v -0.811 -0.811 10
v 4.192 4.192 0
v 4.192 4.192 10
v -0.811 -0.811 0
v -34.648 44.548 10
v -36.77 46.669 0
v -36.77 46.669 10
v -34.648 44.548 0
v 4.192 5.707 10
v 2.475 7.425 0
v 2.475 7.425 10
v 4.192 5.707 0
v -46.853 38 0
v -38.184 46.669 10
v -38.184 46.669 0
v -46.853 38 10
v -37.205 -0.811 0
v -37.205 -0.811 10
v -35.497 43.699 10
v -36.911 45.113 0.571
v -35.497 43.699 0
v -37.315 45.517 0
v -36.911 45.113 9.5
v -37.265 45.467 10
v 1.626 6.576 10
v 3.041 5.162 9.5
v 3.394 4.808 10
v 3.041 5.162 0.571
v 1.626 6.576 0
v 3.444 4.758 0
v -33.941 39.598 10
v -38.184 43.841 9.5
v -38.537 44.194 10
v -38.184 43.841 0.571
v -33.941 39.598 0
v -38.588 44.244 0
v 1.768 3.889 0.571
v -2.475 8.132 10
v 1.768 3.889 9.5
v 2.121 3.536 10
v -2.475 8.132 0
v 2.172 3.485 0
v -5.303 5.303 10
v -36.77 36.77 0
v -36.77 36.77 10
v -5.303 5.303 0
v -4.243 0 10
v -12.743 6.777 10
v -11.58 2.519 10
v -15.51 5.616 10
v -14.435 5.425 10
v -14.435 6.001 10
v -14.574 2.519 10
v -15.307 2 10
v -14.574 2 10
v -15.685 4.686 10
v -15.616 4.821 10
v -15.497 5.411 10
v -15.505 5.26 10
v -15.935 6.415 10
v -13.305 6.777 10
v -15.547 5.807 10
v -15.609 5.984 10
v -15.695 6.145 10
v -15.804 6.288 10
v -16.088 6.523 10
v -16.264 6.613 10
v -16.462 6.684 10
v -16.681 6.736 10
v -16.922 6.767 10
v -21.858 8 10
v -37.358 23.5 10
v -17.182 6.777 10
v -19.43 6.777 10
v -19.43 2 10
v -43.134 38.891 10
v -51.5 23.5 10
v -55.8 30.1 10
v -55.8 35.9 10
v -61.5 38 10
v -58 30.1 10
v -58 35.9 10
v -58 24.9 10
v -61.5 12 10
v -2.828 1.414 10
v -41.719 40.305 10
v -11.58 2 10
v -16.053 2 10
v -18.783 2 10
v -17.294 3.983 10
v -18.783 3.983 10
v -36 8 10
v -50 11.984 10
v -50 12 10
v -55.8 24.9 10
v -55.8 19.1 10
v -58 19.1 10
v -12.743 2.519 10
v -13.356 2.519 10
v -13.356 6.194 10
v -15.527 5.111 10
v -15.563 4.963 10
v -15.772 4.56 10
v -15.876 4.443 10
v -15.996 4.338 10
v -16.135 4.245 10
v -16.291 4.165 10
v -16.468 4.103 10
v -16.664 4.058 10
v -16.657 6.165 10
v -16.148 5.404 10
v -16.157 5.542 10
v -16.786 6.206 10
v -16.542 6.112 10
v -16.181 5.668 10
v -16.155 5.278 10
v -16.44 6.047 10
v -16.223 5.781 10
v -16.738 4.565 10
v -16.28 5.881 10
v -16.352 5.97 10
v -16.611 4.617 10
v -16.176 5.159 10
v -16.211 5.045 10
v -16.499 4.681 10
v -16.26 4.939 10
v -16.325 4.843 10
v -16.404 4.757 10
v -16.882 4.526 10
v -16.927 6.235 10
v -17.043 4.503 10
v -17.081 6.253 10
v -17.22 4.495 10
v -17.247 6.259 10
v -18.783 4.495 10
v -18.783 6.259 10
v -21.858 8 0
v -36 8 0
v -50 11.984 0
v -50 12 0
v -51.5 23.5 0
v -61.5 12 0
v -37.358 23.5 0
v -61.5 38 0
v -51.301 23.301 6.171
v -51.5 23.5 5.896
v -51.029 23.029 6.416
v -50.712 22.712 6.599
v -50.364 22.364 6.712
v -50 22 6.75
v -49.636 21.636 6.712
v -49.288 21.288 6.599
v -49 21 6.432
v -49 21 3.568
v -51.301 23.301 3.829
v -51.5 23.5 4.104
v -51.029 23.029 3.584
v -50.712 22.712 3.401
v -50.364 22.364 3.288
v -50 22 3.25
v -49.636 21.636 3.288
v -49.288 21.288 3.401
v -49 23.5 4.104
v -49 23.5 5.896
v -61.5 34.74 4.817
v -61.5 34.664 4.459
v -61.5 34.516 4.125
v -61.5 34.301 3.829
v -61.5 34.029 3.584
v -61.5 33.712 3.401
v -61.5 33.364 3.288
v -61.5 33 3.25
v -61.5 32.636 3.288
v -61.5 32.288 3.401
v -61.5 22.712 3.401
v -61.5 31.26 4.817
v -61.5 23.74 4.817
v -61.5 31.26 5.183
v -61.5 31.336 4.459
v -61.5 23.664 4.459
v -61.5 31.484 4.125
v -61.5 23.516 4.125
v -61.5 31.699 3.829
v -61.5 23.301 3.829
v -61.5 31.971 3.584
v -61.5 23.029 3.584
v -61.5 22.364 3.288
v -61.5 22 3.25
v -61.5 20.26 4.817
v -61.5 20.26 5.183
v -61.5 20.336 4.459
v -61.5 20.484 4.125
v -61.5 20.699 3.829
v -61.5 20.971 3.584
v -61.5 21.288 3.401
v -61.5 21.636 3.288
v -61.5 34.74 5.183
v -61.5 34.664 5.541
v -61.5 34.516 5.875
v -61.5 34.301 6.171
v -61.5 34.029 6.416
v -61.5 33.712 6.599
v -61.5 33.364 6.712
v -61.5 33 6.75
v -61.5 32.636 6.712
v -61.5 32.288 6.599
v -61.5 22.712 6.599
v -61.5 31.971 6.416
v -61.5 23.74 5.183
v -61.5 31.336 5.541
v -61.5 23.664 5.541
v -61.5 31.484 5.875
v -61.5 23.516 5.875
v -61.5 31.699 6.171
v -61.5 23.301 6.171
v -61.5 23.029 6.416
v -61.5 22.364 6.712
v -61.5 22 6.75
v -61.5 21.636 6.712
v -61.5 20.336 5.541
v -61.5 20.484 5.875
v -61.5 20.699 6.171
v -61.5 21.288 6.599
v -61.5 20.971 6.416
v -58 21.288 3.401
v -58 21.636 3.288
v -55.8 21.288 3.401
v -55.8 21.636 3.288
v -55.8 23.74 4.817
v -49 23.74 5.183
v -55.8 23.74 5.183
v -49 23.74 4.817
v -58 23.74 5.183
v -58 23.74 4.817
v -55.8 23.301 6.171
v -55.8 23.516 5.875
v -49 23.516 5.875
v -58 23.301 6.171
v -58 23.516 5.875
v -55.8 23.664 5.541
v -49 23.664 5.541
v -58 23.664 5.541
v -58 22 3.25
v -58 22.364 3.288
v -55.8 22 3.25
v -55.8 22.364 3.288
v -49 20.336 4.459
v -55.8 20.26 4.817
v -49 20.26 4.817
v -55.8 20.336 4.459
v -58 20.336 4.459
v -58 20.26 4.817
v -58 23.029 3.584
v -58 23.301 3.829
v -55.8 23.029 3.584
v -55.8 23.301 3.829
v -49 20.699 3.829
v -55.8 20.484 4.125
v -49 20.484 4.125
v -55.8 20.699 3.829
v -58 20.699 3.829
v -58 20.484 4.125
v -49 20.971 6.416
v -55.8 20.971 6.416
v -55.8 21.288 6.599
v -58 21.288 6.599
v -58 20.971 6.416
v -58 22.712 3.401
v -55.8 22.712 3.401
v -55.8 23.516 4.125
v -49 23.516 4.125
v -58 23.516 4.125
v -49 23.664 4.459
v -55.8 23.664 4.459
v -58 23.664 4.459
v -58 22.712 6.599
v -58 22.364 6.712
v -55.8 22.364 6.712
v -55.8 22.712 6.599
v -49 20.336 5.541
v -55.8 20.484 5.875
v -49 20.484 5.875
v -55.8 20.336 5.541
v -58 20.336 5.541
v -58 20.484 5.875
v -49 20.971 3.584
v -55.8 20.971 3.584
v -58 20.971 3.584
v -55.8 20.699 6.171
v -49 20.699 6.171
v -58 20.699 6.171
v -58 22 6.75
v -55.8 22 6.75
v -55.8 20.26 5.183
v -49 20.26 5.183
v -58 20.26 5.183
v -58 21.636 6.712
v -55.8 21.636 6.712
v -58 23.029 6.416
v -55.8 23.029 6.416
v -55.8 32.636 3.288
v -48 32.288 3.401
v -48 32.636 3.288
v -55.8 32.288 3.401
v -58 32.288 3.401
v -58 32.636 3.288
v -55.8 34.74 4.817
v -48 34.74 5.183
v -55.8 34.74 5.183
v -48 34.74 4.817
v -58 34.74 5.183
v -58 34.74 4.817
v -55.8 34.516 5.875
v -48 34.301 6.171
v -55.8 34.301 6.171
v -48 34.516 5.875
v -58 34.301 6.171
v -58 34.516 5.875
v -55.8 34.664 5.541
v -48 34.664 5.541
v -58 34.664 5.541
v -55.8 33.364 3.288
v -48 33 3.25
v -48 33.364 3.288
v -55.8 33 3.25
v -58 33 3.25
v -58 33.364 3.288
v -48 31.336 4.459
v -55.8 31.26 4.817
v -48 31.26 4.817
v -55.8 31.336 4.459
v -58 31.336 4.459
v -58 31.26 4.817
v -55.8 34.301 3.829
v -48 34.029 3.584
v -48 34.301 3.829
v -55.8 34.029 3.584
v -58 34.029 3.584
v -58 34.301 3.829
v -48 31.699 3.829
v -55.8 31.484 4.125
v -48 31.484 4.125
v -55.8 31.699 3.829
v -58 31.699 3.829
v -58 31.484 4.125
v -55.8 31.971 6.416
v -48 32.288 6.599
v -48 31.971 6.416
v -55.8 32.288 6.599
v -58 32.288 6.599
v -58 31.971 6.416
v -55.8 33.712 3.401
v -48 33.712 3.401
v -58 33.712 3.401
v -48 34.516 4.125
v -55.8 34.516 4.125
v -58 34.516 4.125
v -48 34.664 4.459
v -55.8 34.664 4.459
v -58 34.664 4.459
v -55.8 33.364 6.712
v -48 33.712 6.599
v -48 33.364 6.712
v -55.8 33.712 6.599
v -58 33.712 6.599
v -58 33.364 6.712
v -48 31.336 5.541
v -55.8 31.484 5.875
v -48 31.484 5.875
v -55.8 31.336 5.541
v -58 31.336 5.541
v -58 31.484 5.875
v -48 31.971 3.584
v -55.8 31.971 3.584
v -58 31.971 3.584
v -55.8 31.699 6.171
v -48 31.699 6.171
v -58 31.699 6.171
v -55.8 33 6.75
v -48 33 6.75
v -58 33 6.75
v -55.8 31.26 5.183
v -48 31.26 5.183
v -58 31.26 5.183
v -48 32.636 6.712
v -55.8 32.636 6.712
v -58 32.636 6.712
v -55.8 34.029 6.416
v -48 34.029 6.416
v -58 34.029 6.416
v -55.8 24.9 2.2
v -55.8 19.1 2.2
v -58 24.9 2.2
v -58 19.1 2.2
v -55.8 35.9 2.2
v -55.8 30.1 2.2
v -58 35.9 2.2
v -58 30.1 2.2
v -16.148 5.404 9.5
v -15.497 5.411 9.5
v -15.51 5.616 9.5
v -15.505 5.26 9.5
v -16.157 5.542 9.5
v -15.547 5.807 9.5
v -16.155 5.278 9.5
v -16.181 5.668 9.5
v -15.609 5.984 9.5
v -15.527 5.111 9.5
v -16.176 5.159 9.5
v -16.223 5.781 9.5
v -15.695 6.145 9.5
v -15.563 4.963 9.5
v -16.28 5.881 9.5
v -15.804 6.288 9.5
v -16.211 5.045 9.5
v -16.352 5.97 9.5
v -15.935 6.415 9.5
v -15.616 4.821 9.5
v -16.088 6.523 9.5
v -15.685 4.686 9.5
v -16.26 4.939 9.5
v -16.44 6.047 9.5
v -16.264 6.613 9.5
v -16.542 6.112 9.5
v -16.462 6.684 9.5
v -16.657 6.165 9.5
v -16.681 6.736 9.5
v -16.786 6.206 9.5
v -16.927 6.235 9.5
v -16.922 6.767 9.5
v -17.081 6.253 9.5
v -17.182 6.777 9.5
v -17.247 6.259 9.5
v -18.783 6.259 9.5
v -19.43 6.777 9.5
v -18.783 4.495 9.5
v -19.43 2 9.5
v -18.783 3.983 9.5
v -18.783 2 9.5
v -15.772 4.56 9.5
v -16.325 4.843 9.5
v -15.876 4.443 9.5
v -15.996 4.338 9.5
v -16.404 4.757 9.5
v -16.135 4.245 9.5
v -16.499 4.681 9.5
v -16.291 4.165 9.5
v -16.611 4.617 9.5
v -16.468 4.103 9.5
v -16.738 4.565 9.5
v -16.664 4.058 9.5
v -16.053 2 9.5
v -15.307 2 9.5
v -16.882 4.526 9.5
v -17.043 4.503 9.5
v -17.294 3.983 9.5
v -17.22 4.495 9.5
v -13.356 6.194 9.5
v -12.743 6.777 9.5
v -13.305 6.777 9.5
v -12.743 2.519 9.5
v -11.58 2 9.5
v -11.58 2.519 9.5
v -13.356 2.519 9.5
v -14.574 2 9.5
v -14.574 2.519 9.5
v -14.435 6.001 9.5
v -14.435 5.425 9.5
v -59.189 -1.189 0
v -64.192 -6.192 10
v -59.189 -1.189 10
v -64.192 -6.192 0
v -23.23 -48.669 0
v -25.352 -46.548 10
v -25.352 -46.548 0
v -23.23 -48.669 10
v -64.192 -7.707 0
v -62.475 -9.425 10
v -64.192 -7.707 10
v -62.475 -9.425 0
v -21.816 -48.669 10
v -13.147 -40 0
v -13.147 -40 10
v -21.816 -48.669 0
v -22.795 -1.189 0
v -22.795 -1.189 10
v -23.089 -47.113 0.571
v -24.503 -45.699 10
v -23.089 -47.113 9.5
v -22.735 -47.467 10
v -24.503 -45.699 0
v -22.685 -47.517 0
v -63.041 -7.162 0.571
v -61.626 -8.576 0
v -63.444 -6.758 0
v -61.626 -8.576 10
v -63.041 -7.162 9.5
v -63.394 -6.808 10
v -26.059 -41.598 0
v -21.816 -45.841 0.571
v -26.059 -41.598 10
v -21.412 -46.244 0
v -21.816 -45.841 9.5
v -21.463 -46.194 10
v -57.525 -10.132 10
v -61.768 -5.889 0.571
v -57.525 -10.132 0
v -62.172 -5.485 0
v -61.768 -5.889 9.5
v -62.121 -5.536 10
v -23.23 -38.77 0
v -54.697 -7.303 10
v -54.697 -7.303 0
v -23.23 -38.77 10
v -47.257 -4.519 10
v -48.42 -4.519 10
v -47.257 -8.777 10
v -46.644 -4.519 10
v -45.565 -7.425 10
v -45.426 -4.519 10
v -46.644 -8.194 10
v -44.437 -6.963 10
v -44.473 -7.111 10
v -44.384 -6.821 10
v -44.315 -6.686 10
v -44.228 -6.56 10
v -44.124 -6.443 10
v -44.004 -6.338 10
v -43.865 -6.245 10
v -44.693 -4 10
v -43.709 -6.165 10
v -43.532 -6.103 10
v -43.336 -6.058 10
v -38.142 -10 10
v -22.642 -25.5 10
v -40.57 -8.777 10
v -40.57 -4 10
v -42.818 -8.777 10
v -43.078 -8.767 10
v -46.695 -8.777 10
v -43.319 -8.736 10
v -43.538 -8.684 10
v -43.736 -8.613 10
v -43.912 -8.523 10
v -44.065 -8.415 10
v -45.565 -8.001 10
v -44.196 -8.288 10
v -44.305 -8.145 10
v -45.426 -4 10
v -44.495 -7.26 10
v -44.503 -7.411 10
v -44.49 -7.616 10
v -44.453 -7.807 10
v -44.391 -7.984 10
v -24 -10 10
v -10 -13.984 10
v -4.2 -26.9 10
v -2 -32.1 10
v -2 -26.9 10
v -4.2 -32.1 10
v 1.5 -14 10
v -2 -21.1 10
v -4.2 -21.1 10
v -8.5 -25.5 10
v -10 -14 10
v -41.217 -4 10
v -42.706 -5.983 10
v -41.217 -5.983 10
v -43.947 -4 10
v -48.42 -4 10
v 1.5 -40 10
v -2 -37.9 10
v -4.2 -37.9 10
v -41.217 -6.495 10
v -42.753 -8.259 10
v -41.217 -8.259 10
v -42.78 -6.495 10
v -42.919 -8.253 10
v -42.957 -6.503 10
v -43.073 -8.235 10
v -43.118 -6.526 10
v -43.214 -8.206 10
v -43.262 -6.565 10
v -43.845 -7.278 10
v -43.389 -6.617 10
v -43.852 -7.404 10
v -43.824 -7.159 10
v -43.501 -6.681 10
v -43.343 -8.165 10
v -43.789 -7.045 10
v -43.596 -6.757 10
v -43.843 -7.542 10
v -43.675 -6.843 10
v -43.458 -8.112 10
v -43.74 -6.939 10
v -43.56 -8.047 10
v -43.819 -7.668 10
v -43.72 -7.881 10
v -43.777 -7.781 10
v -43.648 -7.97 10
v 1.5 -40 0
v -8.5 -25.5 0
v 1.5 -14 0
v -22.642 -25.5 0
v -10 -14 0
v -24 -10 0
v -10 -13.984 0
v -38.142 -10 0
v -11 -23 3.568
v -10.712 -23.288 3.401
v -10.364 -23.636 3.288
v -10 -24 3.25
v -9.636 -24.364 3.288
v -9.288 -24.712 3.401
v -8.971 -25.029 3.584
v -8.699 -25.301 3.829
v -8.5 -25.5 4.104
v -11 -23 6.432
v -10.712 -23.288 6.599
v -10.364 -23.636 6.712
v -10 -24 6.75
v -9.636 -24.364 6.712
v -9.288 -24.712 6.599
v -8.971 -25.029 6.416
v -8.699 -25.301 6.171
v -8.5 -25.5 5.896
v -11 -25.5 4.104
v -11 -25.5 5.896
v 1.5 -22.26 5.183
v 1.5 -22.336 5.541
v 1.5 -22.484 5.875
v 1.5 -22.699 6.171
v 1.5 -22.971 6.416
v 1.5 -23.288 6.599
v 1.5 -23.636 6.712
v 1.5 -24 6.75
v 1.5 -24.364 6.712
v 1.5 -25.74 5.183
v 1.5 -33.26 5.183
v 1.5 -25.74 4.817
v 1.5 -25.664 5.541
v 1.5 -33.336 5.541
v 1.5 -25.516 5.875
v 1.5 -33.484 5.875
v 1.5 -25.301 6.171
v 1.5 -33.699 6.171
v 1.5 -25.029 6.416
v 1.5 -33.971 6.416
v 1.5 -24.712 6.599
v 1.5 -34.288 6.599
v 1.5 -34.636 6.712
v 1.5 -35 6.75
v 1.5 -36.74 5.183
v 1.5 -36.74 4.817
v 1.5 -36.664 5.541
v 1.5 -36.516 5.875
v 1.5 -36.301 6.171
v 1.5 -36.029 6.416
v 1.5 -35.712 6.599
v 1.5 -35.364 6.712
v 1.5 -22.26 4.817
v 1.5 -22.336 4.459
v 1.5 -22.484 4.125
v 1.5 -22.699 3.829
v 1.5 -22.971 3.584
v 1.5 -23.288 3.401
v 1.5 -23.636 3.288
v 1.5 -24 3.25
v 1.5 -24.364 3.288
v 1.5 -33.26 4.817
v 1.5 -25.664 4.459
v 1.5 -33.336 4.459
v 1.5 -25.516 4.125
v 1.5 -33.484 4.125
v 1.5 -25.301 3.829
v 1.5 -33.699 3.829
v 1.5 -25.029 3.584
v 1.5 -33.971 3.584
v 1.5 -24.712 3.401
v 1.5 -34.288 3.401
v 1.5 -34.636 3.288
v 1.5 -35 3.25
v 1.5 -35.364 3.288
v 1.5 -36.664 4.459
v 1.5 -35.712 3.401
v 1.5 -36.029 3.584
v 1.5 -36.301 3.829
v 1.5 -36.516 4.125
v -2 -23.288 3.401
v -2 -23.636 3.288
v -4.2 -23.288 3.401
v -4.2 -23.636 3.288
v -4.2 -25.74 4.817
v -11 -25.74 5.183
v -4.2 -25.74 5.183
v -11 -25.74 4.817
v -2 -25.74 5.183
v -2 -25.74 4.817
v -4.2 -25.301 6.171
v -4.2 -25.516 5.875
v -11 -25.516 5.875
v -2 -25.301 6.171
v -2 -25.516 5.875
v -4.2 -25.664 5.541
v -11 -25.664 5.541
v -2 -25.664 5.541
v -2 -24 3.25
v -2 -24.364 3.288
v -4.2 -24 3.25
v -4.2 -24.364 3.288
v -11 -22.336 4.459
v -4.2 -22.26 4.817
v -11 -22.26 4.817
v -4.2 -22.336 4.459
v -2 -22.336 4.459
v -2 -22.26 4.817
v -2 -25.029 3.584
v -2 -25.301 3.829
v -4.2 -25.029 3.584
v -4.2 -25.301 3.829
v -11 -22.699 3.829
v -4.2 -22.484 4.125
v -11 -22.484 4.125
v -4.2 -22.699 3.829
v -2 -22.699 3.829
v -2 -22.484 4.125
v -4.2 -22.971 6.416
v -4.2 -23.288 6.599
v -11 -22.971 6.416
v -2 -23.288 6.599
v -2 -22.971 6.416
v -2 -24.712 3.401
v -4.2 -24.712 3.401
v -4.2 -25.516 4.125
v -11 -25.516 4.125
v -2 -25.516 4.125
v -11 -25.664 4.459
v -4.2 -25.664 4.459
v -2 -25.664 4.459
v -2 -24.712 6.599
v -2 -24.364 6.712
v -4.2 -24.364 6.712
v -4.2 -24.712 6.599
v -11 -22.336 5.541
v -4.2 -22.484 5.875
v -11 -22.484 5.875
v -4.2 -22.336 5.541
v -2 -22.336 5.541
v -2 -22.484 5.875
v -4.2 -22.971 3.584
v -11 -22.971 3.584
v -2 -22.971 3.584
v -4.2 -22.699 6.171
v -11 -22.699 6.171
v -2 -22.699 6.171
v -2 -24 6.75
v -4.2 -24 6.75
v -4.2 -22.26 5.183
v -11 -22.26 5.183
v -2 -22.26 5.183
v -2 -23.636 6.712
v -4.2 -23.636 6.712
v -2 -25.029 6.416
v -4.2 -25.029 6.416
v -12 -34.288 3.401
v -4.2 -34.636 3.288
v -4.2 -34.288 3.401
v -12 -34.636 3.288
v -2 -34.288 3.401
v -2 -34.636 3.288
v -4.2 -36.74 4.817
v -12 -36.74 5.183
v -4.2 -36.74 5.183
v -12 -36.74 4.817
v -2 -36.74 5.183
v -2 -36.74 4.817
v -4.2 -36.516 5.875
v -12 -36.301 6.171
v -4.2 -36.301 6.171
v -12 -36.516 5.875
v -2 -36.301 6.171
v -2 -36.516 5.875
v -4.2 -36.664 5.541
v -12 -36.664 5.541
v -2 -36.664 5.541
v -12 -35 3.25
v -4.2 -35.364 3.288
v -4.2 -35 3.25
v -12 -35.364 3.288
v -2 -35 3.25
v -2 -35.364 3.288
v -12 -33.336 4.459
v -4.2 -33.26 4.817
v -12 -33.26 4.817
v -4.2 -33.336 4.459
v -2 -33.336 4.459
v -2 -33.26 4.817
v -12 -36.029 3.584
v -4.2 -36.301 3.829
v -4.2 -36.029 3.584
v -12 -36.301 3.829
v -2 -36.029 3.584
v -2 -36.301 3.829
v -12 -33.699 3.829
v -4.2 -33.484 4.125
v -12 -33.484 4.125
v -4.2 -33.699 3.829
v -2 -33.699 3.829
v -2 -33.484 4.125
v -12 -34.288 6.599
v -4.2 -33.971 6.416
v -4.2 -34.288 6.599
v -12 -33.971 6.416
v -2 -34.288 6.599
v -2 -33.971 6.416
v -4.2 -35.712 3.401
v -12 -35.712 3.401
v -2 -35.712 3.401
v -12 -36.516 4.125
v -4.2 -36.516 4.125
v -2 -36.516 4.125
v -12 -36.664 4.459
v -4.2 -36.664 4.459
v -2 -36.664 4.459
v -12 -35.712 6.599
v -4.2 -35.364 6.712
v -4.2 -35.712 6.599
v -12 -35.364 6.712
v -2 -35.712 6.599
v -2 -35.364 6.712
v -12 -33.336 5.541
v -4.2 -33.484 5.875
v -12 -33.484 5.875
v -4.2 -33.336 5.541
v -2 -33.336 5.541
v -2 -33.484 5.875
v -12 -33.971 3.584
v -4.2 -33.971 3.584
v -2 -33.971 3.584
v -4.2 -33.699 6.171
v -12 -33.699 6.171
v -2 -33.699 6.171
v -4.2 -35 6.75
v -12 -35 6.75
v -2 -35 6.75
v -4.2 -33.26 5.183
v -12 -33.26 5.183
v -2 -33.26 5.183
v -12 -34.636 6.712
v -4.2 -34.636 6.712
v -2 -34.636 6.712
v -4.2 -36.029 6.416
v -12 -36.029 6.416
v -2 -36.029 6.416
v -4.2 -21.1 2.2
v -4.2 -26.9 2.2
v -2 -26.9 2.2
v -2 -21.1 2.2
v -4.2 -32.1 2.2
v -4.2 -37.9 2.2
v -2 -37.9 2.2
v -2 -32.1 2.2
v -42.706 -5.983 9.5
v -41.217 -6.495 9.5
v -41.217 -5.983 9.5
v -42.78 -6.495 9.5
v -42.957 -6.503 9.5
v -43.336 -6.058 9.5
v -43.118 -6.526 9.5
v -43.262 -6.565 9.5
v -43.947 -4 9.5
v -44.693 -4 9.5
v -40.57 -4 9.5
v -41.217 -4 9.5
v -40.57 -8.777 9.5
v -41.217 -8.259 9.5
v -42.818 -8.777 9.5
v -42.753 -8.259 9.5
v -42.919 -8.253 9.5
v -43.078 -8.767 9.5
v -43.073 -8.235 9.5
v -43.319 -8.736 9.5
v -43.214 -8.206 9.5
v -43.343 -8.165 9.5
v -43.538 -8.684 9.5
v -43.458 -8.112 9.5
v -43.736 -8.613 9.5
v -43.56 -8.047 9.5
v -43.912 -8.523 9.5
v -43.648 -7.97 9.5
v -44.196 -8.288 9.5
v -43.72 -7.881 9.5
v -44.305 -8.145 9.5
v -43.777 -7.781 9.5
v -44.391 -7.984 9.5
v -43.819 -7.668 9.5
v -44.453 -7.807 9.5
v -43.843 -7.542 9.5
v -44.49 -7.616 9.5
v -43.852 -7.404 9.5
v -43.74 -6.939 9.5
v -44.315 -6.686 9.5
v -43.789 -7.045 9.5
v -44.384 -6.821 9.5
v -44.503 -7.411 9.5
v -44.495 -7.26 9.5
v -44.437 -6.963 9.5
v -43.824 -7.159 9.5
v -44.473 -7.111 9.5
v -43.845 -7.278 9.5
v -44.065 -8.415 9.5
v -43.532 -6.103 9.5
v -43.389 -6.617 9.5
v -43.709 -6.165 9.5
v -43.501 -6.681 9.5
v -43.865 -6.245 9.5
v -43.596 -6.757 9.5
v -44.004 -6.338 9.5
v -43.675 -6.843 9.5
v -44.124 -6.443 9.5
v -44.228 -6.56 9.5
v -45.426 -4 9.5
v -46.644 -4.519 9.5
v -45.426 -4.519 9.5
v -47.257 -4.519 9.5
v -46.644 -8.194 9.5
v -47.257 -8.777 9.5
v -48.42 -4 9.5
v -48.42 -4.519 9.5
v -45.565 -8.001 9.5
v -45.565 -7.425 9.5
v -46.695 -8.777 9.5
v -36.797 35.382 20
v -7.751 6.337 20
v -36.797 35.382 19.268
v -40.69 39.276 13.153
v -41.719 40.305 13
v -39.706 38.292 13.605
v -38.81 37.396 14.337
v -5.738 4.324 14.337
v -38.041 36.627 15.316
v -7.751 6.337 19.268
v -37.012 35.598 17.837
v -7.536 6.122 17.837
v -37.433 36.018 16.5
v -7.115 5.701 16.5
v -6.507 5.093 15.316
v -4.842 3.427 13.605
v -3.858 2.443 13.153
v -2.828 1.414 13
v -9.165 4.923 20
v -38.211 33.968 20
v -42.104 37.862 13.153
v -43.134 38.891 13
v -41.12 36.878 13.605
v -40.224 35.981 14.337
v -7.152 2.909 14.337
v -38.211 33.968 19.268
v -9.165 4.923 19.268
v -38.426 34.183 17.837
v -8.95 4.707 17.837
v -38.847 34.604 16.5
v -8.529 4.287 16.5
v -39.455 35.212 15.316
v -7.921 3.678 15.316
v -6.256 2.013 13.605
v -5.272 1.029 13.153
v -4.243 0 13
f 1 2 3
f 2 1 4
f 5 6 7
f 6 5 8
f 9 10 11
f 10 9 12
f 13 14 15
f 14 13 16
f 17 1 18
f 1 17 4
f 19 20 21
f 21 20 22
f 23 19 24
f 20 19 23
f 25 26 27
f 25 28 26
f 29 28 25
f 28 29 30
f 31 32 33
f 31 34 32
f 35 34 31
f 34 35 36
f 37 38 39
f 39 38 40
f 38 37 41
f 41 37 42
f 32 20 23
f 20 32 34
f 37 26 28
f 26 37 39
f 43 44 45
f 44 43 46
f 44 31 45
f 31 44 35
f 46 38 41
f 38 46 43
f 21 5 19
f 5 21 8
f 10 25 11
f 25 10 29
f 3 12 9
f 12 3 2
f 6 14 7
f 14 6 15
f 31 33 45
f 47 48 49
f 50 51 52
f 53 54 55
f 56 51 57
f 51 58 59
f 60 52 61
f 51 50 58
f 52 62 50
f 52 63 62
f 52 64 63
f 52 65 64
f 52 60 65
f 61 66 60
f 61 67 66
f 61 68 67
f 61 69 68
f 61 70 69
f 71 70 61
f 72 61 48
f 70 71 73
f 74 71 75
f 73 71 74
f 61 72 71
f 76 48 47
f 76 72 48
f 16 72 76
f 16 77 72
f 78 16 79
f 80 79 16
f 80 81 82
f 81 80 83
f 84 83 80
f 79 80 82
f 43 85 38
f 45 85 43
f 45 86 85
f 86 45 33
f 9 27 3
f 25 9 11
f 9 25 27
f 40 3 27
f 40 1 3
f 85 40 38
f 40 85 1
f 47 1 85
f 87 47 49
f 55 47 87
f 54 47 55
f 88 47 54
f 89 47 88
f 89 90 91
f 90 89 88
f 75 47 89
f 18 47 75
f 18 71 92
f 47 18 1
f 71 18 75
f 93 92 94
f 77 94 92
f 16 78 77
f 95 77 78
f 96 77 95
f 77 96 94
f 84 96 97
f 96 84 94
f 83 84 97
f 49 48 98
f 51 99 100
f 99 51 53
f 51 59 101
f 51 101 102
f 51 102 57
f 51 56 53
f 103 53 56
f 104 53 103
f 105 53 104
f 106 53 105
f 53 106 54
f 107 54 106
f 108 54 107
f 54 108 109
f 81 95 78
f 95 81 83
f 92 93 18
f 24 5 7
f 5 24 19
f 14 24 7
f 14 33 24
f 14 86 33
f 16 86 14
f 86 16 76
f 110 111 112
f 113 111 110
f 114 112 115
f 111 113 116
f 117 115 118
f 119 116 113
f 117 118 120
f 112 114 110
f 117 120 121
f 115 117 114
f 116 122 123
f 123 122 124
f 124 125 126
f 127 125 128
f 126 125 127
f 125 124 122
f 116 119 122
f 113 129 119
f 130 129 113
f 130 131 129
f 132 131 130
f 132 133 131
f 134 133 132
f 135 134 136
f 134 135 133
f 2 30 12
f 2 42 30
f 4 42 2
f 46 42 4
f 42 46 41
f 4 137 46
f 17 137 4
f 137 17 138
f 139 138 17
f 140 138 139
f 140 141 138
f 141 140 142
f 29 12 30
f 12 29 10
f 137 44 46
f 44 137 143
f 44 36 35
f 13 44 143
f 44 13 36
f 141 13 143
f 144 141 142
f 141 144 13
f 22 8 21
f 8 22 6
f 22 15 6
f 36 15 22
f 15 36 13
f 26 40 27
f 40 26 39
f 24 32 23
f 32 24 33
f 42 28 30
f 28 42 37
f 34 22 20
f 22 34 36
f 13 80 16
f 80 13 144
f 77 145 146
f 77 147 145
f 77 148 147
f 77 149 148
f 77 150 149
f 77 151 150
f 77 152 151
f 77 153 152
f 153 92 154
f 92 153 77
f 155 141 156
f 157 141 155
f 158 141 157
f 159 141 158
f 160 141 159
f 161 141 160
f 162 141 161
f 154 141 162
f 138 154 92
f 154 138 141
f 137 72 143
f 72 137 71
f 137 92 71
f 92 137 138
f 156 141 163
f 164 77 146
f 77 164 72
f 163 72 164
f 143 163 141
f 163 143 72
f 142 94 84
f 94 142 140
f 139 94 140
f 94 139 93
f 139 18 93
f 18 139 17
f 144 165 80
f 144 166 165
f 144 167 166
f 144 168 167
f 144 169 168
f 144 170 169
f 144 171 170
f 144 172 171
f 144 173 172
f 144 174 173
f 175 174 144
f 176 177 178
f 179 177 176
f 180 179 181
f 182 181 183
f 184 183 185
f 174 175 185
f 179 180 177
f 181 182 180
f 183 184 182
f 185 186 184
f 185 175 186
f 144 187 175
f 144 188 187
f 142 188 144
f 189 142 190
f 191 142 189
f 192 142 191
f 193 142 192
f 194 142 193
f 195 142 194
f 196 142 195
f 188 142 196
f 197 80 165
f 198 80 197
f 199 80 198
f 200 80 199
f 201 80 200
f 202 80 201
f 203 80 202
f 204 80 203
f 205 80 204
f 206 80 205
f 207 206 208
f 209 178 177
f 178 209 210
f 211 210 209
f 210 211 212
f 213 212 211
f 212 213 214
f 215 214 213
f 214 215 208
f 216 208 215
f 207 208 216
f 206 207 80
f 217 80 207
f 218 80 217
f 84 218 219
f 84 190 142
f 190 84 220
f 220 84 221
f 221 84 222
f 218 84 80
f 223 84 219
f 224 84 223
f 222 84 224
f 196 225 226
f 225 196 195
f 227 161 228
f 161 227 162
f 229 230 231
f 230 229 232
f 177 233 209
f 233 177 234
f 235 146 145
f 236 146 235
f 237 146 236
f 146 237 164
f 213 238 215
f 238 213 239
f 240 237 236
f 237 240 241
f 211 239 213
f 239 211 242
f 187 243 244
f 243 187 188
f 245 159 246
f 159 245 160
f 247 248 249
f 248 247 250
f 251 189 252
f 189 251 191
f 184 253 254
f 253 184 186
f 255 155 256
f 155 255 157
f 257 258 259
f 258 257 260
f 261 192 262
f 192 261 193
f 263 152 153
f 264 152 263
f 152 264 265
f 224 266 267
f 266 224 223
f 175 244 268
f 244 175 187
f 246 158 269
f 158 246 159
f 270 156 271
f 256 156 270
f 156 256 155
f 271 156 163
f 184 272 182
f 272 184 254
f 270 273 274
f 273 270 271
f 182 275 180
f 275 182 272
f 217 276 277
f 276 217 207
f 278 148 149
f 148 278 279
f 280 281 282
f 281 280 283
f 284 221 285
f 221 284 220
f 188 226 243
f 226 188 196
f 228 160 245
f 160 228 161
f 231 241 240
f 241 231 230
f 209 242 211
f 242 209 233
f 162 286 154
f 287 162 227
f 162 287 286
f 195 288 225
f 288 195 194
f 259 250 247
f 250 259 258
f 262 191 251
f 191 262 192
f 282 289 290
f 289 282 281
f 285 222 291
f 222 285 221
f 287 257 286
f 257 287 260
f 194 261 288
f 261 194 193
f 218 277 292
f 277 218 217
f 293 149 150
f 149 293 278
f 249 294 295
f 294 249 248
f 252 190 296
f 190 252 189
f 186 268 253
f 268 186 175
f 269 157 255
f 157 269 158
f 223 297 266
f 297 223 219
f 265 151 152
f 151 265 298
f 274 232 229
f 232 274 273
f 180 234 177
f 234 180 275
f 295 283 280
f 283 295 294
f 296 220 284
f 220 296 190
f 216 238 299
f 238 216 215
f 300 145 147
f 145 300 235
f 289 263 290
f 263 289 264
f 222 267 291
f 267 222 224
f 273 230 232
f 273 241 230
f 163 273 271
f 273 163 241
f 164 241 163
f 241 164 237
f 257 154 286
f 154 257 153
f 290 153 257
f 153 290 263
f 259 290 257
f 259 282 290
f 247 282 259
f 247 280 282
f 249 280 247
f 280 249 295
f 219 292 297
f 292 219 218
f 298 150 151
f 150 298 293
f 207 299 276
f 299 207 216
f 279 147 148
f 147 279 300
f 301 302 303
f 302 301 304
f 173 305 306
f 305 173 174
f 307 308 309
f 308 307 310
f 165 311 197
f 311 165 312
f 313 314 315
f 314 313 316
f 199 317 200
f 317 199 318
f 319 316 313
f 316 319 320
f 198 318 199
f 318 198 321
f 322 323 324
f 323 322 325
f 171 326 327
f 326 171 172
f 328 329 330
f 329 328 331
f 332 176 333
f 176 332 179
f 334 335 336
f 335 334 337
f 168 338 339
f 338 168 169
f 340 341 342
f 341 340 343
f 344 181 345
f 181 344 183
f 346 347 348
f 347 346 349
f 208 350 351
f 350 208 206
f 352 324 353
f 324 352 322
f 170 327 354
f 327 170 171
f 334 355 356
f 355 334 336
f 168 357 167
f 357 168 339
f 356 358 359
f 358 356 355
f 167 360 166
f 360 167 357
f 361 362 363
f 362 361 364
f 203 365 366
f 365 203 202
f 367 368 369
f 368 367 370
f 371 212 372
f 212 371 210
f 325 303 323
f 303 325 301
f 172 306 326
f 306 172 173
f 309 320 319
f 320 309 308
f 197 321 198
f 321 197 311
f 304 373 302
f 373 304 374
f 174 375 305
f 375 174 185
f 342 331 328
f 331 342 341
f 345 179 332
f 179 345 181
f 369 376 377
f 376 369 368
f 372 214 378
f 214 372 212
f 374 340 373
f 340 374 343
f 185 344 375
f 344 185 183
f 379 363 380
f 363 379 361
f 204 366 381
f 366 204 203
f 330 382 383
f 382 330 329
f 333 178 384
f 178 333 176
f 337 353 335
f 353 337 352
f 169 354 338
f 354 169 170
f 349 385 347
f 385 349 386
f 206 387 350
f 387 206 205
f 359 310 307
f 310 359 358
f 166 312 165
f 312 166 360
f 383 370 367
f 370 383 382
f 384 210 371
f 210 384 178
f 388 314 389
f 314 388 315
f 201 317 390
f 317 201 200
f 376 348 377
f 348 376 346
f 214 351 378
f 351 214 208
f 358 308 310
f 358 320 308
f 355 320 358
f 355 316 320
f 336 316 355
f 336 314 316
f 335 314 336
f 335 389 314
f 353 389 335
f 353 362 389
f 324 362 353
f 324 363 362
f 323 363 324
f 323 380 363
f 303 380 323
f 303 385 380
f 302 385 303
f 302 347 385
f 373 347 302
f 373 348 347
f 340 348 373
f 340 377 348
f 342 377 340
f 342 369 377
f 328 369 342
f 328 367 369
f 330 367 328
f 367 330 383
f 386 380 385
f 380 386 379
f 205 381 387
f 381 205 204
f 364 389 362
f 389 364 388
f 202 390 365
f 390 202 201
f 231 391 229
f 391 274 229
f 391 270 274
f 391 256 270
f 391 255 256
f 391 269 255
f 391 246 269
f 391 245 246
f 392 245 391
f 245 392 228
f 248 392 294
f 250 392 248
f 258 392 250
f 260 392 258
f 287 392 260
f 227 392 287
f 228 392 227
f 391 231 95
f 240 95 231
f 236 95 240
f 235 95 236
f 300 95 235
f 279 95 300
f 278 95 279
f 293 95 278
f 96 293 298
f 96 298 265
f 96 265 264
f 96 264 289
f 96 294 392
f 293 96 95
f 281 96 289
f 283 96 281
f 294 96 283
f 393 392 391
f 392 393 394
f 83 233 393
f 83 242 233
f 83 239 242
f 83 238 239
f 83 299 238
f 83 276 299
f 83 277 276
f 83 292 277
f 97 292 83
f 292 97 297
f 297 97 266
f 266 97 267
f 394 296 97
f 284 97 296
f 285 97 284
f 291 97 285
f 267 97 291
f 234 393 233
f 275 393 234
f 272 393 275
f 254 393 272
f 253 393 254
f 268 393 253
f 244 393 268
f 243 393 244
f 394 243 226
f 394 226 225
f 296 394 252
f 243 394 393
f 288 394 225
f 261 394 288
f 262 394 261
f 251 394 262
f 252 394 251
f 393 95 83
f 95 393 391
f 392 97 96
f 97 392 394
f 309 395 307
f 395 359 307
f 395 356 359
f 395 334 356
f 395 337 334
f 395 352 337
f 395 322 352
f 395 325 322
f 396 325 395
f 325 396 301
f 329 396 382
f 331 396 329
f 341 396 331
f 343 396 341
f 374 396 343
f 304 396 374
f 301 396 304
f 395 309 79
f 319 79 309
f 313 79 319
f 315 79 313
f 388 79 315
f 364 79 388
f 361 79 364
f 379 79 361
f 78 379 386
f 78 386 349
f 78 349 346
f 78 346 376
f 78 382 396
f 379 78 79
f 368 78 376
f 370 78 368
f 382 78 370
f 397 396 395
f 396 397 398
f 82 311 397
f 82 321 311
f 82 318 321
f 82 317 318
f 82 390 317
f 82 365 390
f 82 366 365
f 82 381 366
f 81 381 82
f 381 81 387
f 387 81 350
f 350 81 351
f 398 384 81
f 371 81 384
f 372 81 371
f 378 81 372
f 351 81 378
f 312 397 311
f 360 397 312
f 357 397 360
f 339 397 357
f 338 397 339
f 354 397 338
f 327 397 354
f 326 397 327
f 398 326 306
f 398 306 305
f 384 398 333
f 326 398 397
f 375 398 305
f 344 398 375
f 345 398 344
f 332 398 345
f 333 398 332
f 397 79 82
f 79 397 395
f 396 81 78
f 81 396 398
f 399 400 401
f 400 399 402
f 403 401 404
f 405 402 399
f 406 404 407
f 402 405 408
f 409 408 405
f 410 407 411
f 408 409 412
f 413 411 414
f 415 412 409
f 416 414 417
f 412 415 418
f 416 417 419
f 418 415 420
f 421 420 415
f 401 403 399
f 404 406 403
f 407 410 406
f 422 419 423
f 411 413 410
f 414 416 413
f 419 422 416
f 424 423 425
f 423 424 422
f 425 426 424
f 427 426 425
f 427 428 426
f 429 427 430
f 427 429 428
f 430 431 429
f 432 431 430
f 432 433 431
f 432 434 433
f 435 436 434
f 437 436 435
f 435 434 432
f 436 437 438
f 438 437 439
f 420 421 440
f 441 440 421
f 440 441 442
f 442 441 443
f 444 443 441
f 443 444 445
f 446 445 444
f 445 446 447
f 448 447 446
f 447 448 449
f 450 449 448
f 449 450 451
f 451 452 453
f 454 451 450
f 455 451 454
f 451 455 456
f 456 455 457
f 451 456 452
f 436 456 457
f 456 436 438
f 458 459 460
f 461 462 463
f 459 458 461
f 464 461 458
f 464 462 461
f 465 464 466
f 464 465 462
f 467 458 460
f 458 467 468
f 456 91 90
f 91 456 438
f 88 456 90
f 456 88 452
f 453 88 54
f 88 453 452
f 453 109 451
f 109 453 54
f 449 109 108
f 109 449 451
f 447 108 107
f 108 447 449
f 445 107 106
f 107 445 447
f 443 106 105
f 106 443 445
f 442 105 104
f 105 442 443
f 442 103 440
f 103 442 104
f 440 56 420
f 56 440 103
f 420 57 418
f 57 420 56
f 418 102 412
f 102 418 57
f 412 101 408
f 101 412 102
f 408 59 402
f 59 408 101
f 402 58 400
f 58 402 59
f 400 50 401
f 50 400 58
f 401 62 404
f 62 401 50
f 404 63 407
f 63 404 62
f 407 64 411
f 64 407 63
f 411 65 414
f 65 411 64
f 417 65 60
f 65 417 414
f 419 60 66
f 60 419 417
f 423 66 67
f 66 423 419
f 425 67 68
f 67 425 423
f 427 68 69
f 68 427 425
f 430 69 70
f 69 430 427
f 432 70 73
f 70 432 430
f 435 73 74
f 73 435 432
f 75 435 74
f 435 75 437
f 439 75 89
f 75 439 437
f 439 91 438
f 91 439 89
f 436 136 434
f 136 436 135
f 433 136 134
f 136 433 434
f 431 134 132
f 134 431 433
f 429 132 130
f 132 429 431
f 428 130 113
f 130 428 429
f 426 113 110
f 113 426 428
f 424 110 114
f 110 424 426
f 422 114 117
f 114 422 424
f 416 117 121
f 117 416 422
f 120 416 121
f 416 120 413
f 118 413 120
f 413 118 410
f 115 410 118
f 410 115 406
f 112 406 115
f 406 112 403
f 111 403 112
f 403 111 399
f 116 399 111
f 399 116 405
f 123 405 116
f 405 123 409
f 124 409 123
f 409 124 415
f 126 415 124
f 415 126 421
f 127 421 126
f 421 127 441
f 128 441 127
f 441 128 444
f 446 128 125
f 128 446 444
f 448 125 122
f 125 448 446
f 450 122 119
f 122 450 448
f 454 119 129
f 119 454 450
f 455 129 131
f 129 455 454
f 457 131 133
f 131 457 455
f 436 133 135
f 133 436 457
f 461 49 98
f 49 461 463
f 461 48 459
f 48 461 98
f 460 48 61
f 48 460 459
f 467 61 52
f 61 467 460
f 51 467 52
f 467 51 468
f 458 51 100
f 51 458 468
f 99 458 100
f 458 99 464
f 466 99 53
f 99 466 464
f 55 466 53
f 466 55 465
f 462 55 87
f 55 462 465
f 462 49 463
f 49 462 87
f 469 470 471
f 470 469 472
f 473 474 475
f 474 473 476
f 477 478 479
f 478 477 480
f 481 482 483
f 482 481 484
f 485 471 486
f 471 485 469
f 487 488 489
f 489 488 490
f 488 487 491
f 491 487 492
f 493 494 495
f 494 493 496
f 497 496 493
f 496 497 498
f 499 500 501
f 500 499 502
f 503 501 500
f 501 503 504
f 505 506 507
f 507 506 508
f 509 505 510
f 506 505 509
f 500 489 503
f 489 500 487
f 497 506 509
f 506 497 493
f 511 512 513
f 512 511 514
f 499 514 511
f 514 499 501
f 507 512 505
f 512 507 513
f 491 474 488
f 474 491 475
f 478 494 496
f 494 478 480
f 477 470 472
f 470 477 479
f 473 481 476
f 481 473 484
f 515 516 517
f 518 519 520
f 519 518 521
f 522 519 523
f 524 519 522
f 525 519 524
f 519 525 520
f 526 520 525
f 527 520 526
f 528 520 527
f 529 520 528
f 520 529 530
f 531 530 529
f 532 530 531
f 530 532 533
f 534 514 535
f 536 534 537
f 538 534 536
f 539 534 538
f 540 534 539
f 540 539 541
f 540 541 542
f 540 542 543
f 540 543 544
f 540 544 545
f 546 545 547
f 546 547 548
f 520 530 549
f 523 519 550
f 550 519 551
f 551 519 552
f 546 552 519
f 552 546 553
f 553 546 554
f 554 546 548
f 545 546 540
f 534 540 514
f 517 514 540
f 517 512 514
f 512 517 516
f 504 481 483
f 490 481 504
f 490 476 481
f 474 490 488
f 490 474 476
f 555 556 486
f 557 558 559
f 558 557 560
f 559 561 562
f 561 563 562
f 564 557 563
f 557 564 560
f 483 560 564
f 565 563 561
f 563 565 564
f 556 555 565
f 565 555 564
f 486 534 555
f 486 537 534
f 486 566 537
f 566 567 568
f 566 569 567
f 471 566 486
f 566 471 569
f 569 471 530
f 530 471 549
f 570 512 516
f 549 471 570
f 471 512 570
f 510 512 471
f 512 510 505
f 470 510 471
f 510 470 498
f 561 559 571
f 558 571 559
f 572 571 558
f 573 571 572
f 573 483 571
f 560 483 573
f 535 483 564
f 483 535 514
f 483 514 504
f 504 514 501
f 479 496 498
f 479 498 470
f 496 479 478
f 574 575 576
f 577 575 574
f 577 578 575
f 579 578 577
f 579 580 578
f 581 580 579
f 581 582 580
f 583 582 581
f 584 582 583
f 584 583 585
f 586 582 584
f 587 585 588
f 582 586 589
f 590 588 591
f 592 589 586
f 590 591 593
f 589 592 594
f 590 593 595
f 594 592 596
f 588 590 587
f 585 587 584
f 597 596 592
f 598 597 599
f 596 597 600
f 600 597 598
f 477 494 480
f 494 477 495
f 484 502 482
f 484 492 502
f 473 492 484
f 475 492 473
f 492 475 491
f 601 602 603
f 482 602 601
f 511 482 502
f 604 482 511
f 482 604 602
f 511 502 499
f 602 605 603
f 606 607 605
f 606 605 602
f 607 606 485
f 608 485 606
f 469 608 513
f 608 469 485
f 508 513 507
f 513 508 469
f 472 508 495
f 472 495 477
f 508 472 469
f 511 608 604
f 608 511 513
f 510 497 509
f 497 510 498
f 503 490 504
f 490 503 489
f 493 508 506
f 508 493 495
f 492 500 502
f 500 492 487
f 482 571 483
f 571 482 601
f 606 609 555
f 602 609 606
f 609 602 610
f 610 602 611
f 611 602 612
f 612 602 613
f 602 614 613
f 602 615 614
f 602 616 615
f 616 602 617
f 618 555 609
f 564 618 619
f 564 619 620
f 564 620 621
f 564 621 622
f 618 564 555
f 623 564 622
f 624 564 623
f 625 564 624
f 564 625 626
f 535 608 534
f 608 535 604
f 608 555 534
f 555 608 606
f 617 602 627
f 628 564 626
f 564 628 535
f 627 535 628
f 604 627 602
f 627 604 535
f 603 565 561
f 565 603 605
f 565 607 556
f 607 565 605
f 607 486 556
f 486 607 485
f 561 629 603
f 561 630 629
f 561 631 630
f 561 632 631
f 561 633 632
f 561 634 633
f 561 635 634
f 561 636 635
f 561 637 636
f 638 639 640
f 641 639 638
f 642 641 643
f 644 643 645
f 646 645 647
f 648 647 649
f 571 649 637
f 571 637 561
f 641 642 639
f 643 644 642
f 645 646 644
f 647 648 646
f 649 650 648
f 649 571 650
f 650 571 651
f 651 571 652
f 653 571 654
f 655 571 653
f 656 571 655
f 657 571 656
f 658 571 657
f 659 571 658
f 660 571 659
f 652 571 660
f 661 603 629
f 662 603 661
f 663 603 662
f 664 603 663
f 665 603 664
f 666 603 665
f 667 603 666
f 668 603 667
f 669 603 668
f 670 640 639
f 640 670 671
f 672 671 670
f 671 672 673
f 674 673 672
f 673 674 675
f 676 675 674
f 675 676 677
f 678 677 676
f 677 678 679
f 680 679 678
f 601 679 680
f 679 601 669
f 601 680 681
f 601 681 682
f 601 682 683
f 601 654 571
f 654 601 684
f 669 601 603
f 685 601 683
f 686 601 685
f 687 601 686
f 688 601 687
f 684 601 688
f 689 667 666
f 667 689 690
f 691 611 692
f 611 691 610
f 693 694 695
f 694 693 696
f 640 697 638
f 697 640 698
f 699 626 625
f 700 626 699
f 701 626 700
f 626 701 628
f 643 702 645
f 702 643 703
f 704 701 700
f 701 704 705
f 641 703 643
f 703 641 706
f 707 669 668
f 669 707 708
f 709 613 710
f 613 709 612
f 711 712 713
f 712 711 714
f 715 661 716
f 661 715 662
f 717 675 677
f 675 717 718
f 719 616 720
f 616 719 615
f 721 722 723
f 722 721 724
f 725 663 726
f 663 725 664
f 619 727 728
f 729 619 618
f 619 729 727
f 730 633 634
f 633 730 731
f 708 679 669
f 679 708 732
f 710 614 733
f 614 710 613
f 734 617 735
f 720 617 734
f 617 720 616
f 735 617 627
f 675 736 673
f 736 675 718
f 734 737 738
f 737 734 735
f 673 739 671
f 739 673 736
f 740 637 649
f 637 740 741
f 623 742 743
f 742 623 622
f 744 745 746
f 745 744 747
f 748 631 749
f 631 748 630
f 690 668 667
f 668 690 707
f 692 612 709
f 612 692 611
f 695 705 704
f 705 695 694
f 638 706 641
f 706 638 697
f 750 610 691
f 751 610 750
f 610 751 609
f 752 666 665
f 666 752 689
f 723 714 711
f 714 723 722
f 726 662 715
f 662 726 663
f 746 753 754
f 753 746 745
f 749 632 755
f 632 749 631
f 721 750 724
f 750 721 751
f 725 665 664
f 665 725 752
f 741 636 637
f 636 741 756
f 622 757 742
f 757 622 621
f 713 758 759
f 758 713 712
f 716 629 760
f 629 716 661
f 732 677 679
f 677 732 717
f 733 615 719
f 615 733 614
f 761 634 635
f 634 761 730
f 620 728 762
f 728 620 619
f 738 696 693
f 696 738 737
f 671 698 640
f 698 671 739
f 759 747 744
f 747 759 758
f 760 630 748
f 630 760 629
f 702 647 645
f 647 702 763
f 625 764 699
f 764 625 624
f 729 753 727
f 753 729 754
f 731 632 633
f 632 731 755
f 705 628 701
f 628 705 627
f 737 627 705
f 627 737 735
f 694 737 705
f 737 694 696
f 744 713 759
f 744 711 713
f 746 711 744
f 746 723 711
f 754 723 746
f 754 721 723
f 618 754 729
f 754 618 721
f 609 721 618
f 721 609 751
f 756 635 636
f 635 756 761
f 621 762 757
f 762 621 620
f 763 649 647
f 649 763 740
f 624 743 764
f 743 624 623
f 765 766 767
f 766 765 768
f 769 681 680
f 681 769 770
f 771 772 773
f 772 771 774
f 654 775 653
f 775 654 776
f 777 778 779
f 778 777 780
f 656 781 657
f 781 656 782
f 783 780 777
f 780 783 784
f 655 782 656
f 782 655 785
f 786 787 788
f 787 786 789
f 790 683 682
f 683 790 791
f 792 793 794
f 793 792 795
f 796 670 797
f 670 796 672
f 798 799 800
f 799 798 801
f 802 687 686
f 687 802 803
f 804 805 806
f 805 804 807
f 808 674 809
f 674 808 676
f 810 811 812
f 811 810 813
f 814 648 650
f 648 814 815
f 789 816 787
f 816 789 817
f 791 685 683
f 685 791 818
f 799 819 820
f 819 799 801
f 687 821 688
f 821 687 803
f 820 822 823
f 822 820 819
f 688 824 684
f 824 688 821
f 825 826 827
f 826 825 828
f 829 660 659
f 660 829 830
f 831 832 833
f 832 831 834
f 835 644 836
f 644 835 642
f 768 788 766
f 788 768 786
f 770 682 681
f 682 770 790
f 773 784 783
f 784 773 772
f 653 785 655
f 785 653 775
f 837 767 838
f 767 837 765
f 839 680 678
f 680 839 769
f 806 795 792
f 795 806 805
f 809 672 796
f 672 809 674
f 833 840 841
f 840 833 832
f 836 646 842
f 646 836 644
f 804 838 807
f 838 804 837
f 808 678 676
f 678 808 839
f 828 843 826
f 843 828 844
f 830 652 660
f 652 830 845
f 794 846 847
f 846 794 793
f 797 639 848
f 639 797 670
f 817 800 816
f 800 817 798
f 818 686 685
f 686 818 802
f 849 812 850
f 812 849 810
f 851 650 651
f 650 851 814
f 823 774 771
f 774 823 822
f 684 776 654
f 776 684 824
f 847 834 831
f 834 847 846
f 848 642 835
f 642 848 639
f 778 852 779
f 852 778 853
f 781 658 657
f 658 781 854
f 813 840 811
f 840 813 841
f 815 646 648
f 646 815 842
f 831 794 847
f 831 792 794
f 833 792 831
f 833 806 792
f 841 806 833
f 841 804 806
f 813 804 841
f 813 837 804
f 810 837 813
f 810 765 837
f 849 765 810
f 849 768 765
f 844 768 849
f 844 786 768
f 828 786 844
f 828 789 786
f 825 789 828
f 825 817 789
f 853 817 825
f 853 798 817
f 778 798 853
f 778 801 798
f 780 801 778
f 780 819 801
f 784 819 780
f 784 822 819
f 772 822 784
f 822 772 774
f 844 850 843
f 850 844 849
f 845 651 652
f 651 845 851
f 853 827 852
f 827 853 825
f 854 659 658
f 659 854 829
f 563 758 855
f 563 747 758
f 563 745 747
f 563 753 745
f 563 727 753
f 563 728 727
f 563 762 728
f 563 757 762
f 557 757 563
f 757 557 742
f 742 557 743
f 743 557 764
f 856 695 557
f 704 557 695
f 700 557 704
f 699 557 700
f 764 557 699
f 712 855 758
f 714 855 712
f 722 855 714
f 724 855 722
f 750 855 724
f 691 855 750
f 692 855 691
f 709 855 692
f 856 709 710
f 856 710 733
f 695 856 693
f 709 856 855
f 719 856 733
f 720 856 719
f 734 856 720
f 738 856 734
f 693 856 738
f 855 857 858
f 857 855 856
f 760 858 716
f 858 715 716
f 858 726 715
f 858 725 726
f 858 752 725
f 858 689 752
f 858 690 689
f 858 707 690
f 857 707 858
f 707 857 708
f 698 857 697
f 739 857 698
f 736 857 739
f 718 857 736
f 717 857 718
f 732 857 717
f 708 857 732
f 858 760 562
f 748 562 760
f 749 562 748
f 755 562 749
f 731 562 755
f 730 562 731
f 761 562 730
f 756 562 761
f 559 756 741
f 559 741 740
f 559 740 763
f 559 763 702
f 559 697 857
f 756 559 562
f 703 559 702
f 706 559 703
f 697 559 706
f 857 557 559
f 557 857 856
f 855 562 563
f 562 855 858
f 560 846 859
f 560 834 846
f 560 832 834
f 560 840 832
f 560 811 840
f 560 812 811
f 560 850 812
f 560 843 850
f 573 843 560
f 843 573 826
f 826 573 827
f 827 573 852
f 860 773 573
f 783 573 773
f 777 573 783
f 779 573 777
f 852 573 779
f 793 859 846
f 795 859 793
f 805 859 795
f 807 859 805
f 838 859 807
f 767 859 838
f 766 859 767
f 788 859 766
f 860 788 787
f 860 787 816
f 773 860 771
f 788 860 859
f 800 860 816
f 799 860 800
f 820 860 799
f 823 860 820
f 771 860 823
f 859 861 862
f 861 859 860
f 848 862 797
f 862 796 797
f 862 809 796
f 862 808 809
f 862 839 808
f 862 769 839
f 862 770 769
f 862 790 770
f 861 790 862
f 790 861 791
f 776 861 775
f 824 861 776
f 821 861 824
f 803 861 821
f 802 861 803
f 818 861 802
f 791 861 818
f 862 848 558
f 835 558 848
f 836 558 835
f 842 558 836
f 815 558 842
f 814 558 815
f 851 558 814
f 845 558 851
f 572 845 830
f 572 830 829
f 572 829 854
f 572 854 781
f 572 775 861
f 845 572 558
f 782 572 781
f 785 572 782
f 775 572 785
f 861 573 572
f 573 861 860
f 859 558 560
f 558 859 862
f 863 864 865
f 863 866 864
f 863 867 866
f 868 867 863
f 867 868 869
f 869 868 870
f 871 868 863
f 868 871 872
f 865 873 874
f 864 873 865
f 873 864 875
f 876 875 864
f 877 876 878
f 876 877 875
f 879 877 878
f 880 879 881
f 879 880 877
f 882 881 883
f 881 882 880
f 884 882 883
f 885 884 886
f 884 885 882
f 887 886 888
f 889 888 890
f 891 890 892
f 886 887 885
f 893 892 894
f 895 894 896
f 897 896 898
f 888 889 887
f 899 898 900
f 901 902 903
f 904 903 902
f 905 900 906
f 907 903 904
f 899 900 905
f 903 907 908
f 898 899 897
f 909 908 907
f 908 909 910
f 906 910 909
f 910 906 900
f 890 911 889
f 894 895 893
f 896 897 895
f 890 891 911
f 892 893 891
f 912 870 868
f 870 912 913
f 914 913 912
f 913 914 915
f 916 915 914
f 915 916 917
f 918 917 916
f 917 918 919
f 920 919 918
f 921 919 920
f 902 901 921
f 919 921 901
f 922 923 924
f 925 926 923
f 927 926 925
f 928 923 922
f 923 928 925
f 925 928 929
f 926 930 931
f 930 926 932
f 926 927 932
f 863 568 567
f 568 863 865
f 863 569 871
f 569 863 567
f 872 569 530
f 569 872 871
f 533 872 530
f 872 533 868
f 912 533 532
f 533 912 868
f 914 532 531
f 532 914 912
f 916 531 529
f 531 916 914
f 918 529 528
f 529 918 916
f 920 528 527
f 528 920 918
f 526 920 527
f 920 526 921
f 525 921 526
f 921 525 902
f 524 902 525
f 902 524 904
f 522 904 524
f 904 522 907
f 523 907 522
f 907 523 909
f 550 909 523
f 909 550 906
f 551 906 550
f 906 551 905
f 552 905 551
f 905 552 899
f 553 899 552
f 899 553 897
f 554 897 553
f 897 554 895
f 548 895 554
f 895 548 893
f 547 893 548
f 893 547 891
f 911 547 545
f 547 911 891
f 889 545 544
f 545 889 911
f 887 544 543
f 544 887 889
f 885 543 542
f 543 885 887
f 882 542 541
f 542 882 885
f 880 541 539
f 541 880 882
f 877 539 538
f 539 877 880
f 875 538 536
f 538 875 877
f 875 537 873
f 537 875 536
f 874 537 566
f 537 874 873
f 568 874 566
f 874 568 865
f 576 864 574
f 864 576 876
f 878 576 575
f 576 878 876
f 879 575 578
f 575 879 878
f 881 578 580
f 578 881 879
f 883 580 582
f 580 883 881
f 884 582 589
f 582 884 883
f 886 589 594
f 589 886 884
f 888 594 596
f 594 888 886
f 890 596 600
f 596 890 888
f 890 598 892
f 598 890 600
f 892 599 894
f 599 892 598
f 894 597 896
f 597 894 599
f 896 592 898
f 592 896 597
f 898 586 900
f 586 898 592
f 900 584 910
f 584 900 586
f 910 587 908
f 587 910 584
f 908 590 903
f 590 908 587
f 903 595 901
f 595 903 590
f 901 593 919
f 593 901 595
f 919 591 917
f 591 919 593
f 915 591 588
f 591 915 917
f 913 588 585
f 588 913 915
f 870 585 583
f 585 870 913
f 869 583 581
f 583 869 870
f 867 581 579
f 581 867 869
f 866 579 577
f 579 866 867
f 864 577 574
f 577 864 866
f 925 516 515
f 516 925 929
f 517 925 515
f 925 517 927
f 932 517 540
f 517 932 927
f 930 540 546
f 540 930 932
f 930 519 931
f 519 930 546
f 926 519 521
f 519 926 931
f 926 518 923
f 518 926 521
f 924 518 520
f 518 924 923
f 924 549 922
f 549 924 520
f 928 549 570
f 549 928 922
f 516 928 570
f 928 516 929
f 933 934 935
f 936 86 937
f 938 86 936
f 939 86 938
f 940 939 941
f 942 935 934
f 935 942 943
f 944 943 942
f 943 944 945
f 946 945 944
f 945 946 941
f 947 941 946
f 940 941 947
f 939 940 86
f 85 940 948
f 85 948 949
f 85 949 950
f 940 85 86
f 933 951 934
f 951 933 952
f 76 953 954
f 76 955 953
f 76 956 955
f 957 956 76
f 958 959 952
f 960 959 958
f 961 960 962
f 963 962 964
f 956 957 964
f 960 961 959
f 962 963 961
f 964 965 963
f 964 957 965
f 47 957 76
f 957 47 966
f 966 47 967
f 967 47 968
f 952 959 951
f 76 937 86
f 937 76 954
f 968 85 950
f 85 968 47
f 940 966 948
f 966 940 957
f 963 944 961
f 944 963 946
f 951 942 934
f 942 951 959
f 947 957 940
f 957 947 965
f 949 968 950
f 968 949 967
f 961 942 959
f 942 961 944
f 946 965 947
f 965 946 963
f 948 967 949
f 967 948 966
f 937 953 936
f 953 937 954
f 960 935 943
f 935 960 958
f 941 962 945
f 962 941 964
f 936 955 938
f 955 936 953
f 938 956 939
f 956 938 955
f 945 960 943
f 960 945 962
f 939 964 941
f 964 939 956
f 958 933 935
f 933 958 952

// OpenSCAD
// PRUSA iteration4
// lcd supports
// GNU GPL v3
// Josef Průša <iam@josefprusa.cz> and contributors
// http://www.reprap.org/wiki/Prusa_Mendel
// http://prusamendel.org




module body()
{

    difference()
    {
    // base block
    translate([-55, -2, 0]) cube([69, 81, 10]);

        union()
        {
            // outer body shape
            translate([-69.6, 32, -1]) rotate([0, 0, 45]) cube([60, 53, 15]);
            translate([13.7, 89.7, -1]) rotate([0, 0, 135]) cube([60, 42, 15]);
            translate([-19, -9, -1]) cube([60, 9, 15]);
            translate([7, -3, -1]) cube([60, 68, 16]);
            translate([-16, 60, -1]) cube([60, 50, 15]);
            translate([-41, -45, -1]) rotate([0, 0, 45]) cube([60, 80, 13]);

            // pcb cout out
            translate([4, 1.5, -1]) cube([1.8, 56.5, 17]);
            translate([0, 7.5, -1]) cube([5.8, 44.5, 17]);
            translate([4.8, 3.5, -1]) cube([5.8, 52.5, 17]);
            translate([8, -5, -1]) rotate([0, 0, 45]) cube([5, 5, 17]);
            translate([8, 58, -1]) rotate([0, 0, 45]) cube([5, 5, 17]);
        }

        // pcb inserts
        translate([4, 3, 8]) rotate([45, 0, 0]) cube([1.8, 5, 5]);
        translate([4, 56.5, 8]) rotate([45, 0, 0]) cube([1.8, 5, 5]);
        translate([4, 3, -5]) rotate([45, 0, 0]) cube([1.8, 5, 5]);
        translate([4, 56.5, -5]) rotate([45, 0, 0]) cube([1.8, 5, 5]);
    }
}

module support()
{
    difference()
    {
        union()
        {
            rotate([0, 0, 45]) body();
            // screw block
            translate([-72, 22, 0]) cube([30, 16, 10]);
        }

        // lower angled part cut
        translate([-75, -2, -1]) cube([20, 14, 15]);
        translate([-70, -2, -1]) cube([20, 14, 15]);
        translate([-50, -16.3, -1]) rotate([0, 0, 45]) cube([20, 20, 15]);

        translate([-76.5, -2, -1]) cube([15, 40, 15]);

        difference()
        {
            translate([-28, 0, -1]) rotate([0, 0, 45]) cube([10, 40, 15]);
            translate([-38, -12, -1]) cube([20, 20, 15]);
            translate([-58, 23.5, -1]) cube([25, 25, 15]);
        }

        // screw holes
        translate([-71, 18 + 4, 5]) rotate([0, 90, 0]) cylinder(h = 22, r = 1.75, $fn = 30);
        translate([-70, 29 + 4, 5]) rotate([0, 90, 0]) cylinder(h = 22, r = 1.75, $fn = 30);

        // nut traps
        translate([-58, 15.1 + 4, 5 - 2.8]) cube([2.2, 5.8, 29.7]);
        translate([-58, 26.1 + 4, 5 - 2.8]) cube([2.2, 5.8, 29.7]);

        // version
        translate([-20, 2, 9.5]) rotate([0, 0, 0]) linear_extrude(height = 0.6)
        { text("R1", font = "helvetica:style = Bold", size = 5, center = true); }
    }
}

module left_lcd_support()
{
    support();

    rotate([0, 0, 45]) difference()
    {
        // sd card shield
        translate([-3, 3, 10]) cube([2, 55, 10]);
        translate([-4, 3, 20]) rotate([0, 90, 0]) cylinder(h = 4, r = 7, $fn = 30);
        translate([-4, 58, 20]) rotate([0, 90, 0]) cylinder(h = 4, r = 7, $fn = 30);
    }
}

translate([-60, -2, 0]) rotate([0, 0, 180]) support();
left_lcd_support();
